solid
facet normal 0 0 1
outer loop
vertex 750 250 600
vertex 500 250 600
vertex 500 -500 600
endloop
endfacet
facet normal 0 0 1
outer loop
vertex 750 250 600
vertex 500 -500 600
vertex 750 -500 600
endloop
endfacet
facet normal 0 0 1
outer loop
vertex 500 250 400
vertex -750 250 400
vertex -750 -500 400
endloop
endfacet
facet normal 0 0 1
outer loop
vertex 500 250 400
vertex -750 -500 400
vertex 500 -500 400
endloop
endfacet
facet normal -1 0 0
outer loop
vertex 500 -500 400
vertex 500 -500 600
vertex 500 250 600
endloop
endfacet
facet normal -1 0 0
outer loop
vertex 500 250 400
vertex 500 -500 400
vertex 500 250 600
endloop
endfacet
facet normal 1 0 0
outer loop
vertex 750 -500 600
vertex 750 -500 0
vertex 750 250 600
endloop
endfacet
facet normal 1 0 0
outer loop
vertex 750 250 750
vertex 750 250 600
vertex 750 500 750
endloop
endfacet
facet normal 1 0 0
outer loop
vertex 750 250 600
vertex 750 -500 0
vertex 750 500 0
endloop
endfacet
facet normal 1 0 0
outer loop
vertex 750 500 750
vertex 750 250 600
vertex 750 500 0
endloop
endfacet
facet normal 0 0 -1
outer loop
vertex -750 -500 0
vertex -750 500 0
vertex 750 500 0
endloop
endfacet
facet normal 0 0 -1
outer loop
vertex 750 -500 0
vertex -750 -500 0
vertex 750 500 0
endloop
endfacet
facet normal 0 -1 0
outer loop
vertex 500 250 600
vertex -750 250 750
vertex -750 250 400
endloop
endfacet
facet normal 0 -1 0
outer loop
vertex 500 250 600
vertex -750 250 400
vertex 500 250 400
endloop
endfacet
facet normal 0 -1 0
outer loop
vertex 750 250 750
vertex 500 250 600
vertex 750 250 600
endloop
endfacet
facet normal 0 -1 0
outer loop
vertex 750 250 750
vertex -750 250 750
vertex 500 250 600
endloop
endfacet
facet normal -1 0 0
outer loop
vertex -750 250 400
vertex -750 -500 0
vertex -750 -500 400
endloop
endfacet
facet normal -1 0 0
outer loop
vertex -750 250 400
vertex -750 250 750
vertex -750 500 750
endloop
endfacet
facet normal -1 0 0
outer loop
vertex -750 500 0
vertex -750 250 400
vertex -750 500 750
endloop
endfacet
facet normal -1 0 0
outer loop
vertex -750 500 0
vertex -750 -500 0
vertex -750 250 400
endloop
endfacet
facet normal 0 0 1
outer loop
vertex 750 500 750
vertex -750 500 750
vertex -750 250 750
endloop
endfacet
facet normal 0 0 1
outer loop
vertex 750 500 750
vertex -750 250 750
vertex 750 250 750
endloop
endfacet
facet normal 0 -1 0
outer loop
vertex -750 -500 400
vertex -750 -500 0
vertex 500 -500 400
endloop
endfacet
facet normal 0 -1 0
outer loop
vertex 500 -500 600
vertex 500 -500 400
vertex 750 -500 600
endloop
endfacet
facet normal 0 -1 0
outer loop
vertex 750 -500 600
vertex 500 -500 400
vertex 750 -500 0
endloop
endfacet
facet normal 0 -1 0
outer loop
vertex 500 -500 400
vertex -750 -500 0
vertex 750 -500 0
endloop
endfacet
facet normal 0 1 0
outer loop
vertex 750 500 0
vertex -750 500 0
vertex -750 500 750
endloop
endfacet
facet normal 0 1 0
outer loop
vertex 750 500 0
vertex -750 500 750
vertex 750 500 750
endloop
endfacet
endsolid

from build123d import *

# Parameters (mm, degrees)
F0_W     = 1500
F0_H     = 1000
F1_DEPTH = 750
F2_W     = 1250
F2_H     = 750
F3_DEPTH = 350
F4_W     = 250
F4_H     = 750
F5_DEPTH = 150


with BuildPart() as f1:
    # F0 (on Top) → F1 (new body)
    with BuildSketch(Plane.XY):
        Rectangle(F0_W, F0_H)
    extrude(amount=F1_DEPTH)

    # F2 (on face) → F3 (cut)
    with BuildSketch(Plane.XY.offset(750)):
        with Locations((-125, -125)):
            Rectangle(F2_W, F2_H)
    extrude(amount=-F3_DEPTH, mode=Mode.SUBTRACT)

    # F4 (on face) → F5 (cut)
    with BuildSketch(Plane.XY.offset(750)):
        with Locations((625, -125)):
            Rectangle(F4_W, F4_H)
    extrude(amount=-F5_DEPTH, mode=Mode.SUBTRACT)


solid = f1.part
